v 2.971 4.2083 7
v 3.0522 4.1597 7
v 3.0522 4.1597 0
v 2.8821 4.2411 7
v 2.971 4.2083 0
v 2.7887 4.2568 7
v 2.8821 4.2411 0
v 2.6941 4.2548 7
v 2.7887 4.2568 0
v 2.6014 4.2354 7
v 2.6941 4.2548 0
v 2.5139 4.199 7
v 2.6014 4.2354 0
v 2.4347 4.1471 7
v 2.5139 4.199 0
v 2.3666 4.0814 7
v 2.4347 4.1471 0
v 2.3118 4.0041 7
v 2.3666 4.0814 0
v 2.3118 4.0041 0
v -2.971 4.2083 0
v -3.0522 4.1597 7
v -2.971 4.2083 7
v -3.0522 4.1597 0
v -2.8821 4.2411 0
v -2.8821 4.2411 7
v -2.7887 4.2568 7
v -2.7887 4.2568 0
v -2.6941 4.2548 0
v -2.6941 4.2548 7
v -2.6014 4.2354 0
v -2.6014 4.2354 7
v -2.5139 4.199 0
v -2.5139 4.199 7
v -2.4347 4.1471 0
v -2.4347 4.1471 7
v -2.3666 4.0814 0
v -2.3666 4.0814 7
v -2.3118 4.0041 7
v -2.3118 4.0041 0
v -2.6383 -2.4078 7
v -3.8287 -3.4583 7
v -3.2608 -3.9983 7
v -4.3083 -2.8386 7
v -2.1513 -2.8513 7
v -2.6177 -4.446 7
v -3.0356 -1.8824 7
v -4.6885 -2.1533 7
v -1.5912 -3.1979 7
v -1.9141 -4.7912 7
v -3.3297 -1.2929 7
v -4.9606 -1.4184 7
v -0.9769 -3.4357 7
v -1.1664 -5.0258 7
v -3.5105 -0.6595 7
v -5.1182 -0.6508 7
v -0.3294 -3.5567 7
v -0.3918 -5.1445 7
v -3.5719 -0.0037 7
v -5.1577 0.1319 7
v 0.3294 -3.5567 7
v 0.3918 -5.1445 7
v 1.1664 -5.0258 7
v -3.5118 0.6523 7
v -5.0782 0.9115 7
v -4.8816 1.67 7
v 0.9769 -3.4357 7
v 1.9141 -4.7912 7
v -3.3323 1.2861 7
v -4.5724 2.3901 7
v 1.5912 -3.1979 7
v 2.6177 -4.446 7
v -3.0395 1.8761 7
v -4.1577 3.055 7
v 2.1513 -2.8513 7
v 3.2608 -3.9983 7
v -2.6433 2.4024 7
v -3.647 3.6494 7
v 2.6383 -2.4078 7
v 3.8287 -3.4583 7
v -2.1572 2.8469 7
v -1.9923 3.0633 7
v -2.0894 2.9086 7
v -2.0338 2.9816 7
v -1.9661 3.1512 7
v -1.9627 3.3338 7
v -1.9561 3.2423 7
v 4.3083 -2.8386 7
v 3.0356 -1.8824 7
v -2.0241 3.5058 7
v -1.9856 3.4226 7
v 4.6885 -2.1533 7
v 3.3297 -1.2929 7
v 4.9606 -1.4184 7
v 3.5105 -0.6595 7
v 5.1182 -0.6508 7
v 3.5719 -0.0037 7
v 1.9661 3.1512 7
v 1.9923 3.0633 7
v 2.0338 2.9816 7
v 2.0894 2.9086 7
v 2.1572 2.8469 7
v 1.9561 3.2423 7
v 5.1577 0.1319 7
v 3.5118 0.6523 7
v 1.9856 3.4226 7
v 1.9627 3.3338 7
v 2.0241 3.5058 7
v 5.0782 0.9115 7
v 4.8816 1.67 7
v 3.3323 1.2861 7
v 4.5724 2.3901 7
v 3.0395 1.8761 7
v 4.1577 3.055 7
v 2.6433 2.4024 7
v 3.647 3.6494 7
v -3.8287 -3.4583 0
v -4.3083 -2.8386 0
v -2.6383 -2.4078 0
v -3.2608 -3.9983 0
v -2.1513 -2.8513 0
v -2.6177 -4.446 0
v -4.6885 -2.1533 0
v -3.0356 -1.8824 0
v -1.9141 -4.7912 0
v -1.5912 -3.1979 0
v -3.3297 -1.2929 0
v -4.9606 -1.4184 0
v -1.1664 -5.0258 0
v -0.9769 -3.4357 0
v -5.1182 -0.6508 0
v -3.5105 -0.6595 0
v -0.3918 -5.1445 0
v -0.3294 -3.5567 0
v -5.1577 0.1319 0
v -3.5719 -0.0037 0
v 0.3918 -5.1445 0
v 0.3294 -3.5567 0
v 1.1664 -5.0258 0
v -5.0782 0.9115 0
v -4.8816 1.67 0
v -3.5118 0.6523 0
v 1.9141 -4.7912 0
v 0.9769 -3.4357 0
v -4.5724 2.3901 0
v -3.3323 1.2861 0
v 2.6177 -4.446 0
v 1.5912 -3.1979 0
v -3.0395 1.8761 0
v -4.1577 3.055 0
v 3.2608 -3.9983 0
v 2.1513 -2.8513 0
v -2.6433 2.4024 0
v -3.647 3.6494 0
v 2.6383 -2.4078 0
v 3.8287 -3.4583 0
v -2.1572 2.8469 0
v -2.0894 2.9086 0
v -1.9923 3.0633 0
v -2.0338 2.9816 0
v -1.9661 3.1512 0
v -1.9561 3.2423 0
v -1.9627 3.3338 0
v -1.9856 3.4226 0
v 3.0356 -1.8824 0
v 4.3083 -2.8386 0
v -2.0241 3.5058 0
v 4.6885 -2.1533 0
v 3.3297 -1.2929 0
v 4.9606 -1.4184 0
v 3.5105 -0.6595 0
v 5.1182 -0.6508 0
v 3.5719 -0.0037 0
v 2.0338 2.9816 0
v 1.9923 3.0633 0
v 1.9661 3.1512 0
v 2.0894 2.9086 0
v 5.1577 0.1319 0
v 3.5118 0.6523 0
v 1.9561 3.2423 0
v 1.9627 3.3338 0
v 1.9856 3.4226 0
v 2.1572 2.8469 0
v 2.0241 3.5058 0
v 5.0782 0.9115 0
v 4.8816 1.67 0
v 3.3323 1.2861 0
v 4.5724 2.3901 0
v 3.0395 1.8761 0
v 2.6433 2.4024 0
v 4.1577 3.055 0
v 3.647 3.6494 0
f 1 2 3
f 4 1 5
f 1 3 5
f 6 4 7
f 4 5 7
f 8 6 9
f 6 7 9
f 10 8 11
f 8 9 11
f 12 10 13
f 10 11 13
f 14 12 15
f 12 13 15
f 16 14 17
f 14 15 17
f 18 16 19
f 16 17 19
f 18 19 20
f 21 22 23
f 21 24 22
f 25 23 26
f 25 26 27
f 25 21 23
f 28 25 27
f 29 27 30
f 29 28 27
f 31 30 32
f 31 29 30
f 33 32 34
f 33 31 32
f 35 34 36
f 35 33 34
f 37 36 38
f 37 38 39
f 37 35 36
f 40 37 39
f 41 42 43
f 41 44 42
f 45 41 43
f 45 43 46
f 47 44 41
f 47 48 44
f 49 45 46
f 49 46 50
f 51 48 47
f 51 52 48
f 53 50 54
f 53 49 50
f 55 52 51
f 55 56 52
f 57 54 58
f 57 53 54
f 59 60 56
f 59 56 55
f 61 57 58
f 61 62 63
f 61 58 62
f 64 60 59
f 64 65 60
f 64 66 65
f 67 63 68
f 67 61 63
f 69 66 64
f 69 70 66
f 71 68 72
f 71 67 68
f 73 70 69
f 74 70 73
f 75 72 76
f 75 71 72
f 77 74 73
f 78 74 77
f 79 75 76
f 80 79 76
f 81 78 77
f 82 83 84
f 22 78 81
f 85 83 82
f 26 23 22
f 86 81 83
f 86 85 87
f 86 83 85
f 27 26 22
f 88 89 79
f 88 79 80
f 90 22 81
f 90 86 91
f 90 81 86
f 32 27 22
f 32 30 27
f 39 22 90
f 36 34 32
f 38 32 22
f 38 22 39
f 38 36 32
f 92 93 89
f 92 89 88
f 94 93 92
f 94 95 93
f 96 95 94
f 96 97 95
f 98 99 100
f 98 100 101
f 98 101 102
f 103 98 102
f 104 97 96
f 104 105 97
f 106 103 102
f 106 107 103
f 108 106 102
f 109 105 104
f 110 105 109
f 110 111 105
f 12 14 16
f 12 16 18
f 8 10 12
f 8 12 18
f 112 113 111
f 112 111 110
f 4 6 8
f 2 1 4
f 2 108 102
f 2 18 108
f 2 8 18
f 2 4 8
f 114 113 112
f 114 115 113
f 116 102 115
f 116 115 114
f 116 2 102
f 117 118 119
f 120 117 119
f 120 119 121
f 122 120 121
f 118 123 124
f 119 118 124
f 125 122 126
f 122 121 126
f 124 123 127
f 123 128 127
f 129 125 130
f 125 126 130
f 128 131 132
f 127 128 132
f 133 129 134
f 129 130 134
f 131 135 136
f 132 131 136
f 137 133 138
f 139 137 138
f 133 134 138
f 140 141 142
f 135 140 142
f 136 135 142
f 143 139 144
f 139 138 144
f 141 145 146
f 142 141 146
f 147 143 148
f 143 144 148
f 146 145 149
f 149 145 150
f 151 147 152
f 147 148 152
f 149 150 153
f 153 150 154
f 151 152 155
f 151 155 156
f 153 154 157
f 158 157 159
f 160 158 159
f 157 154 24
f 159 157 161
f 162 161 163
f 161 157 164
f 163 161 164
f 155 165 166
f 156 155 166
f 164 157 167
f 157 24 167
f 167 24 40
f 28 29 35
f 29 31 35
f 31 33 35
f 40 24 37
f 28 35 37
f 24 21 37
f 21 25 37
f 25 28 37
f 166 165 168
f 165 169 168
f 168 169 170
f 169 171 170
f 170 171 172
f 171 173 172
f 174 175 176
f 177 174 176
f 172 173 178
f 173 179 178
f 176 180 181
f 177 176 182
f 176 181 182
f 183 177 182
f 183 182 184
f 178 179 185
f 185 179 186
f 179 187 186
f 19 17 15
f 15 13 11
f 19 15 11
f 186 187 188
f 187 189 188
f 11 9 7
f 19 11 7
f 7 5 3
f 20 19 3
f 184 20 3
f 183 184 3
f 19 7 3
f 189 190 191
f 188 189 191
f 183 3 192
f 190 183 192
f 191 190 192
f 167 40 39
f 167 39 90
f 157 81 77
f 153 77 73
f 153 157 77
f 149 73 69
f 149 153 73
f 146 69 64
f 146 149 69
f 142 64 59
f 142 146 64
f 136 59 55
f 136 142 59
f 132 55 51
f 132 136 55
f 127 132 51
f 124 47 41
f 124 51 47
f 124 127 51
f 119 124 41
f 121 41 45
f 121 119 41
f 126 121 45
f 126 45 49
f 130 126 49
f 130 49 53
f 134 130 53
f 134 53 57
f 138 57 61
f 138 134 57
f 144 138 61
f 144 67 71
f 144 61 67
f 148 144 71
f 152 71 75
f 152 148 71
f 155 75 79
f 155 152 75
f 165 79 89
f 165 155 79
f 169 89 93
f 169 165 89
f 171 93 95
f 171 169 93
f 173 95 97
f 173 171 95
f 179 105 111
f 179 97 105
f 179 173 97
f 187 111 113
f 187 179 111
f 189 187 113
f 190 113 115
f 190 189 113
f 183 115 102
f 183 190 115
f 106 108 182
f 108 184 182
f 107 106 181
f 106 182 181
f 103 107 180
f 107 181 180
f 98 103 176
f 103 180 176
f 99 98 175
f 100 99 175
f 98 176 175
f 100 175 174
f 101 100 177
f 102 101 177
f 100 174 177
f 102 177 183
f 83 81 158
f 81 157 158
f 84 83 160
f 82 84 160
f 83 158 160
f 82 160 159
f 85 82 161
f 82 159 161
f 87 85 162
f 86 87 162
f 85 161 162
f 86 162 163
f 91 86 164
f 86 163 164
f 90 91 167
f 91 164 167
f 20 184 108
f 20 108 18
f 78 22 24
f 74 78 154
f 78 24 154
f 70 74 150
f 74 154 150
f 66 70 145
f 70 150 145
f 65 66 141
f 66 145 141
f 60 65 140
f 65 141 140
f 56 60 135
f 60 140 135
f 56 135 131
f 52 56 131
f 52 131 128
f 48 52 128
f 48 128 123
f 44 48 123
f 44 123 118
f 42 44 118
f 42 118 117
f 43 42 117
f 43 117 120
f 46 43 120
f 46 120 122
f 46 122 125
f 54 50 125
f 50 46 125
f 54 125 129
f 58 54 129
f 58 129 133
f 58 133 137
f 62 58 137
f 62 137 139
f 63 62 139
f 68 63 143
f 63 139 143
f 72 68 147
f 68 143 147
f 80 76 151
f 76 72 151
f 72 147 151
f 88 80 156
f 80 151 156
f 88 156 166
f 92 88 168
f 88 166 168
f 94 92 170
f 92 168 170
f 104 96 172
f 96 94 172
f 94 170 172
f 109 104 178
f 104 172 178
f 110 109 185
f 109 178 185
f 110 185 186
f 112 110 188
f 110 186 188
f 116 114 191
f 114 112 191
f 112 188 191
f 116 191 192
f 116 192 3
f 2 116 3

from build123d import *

# Parameters (mm, degrees)
F0_R     = 5.159375
F0_R_2   = 3.571875
F1_DEPTH = 7
F3_DEPTH = 7.001
F4_R     = 0.508


with BuildPart() as f1:
    # F0 (on Top) → F1 (new body)
    with BuildSketch(Plane.XY):
        Circle(F0_R)
        Circle(F0_R_2, mode=Mode.SUBTRACT)
    extrude(amount=F1_DEPTH)

    # F2 (on Top) → F3 (cut, through all)
    with BuildSketch(Plane.XY):
        Polygon((-2.978767, 5.159375), (0, 0), (2.978767, 5.159375), align=None)
    extrude(amount=F3_DEPTH, mode=Mode.SUBTRACT)

    # F4
    f4_edges = [f1.edges().sort_by_distance(p)[0] for p in [
        (1.785938, 3.093334, 3.5),
        (-1.785937, 3.093334, 3.5),
        (-2.579687, 4.46815, 3.5),
        (2.579688, 4.46815, 3.5),
    ]]
    fillet(f4_edges, radius=F4_R)


solid = f1.part
